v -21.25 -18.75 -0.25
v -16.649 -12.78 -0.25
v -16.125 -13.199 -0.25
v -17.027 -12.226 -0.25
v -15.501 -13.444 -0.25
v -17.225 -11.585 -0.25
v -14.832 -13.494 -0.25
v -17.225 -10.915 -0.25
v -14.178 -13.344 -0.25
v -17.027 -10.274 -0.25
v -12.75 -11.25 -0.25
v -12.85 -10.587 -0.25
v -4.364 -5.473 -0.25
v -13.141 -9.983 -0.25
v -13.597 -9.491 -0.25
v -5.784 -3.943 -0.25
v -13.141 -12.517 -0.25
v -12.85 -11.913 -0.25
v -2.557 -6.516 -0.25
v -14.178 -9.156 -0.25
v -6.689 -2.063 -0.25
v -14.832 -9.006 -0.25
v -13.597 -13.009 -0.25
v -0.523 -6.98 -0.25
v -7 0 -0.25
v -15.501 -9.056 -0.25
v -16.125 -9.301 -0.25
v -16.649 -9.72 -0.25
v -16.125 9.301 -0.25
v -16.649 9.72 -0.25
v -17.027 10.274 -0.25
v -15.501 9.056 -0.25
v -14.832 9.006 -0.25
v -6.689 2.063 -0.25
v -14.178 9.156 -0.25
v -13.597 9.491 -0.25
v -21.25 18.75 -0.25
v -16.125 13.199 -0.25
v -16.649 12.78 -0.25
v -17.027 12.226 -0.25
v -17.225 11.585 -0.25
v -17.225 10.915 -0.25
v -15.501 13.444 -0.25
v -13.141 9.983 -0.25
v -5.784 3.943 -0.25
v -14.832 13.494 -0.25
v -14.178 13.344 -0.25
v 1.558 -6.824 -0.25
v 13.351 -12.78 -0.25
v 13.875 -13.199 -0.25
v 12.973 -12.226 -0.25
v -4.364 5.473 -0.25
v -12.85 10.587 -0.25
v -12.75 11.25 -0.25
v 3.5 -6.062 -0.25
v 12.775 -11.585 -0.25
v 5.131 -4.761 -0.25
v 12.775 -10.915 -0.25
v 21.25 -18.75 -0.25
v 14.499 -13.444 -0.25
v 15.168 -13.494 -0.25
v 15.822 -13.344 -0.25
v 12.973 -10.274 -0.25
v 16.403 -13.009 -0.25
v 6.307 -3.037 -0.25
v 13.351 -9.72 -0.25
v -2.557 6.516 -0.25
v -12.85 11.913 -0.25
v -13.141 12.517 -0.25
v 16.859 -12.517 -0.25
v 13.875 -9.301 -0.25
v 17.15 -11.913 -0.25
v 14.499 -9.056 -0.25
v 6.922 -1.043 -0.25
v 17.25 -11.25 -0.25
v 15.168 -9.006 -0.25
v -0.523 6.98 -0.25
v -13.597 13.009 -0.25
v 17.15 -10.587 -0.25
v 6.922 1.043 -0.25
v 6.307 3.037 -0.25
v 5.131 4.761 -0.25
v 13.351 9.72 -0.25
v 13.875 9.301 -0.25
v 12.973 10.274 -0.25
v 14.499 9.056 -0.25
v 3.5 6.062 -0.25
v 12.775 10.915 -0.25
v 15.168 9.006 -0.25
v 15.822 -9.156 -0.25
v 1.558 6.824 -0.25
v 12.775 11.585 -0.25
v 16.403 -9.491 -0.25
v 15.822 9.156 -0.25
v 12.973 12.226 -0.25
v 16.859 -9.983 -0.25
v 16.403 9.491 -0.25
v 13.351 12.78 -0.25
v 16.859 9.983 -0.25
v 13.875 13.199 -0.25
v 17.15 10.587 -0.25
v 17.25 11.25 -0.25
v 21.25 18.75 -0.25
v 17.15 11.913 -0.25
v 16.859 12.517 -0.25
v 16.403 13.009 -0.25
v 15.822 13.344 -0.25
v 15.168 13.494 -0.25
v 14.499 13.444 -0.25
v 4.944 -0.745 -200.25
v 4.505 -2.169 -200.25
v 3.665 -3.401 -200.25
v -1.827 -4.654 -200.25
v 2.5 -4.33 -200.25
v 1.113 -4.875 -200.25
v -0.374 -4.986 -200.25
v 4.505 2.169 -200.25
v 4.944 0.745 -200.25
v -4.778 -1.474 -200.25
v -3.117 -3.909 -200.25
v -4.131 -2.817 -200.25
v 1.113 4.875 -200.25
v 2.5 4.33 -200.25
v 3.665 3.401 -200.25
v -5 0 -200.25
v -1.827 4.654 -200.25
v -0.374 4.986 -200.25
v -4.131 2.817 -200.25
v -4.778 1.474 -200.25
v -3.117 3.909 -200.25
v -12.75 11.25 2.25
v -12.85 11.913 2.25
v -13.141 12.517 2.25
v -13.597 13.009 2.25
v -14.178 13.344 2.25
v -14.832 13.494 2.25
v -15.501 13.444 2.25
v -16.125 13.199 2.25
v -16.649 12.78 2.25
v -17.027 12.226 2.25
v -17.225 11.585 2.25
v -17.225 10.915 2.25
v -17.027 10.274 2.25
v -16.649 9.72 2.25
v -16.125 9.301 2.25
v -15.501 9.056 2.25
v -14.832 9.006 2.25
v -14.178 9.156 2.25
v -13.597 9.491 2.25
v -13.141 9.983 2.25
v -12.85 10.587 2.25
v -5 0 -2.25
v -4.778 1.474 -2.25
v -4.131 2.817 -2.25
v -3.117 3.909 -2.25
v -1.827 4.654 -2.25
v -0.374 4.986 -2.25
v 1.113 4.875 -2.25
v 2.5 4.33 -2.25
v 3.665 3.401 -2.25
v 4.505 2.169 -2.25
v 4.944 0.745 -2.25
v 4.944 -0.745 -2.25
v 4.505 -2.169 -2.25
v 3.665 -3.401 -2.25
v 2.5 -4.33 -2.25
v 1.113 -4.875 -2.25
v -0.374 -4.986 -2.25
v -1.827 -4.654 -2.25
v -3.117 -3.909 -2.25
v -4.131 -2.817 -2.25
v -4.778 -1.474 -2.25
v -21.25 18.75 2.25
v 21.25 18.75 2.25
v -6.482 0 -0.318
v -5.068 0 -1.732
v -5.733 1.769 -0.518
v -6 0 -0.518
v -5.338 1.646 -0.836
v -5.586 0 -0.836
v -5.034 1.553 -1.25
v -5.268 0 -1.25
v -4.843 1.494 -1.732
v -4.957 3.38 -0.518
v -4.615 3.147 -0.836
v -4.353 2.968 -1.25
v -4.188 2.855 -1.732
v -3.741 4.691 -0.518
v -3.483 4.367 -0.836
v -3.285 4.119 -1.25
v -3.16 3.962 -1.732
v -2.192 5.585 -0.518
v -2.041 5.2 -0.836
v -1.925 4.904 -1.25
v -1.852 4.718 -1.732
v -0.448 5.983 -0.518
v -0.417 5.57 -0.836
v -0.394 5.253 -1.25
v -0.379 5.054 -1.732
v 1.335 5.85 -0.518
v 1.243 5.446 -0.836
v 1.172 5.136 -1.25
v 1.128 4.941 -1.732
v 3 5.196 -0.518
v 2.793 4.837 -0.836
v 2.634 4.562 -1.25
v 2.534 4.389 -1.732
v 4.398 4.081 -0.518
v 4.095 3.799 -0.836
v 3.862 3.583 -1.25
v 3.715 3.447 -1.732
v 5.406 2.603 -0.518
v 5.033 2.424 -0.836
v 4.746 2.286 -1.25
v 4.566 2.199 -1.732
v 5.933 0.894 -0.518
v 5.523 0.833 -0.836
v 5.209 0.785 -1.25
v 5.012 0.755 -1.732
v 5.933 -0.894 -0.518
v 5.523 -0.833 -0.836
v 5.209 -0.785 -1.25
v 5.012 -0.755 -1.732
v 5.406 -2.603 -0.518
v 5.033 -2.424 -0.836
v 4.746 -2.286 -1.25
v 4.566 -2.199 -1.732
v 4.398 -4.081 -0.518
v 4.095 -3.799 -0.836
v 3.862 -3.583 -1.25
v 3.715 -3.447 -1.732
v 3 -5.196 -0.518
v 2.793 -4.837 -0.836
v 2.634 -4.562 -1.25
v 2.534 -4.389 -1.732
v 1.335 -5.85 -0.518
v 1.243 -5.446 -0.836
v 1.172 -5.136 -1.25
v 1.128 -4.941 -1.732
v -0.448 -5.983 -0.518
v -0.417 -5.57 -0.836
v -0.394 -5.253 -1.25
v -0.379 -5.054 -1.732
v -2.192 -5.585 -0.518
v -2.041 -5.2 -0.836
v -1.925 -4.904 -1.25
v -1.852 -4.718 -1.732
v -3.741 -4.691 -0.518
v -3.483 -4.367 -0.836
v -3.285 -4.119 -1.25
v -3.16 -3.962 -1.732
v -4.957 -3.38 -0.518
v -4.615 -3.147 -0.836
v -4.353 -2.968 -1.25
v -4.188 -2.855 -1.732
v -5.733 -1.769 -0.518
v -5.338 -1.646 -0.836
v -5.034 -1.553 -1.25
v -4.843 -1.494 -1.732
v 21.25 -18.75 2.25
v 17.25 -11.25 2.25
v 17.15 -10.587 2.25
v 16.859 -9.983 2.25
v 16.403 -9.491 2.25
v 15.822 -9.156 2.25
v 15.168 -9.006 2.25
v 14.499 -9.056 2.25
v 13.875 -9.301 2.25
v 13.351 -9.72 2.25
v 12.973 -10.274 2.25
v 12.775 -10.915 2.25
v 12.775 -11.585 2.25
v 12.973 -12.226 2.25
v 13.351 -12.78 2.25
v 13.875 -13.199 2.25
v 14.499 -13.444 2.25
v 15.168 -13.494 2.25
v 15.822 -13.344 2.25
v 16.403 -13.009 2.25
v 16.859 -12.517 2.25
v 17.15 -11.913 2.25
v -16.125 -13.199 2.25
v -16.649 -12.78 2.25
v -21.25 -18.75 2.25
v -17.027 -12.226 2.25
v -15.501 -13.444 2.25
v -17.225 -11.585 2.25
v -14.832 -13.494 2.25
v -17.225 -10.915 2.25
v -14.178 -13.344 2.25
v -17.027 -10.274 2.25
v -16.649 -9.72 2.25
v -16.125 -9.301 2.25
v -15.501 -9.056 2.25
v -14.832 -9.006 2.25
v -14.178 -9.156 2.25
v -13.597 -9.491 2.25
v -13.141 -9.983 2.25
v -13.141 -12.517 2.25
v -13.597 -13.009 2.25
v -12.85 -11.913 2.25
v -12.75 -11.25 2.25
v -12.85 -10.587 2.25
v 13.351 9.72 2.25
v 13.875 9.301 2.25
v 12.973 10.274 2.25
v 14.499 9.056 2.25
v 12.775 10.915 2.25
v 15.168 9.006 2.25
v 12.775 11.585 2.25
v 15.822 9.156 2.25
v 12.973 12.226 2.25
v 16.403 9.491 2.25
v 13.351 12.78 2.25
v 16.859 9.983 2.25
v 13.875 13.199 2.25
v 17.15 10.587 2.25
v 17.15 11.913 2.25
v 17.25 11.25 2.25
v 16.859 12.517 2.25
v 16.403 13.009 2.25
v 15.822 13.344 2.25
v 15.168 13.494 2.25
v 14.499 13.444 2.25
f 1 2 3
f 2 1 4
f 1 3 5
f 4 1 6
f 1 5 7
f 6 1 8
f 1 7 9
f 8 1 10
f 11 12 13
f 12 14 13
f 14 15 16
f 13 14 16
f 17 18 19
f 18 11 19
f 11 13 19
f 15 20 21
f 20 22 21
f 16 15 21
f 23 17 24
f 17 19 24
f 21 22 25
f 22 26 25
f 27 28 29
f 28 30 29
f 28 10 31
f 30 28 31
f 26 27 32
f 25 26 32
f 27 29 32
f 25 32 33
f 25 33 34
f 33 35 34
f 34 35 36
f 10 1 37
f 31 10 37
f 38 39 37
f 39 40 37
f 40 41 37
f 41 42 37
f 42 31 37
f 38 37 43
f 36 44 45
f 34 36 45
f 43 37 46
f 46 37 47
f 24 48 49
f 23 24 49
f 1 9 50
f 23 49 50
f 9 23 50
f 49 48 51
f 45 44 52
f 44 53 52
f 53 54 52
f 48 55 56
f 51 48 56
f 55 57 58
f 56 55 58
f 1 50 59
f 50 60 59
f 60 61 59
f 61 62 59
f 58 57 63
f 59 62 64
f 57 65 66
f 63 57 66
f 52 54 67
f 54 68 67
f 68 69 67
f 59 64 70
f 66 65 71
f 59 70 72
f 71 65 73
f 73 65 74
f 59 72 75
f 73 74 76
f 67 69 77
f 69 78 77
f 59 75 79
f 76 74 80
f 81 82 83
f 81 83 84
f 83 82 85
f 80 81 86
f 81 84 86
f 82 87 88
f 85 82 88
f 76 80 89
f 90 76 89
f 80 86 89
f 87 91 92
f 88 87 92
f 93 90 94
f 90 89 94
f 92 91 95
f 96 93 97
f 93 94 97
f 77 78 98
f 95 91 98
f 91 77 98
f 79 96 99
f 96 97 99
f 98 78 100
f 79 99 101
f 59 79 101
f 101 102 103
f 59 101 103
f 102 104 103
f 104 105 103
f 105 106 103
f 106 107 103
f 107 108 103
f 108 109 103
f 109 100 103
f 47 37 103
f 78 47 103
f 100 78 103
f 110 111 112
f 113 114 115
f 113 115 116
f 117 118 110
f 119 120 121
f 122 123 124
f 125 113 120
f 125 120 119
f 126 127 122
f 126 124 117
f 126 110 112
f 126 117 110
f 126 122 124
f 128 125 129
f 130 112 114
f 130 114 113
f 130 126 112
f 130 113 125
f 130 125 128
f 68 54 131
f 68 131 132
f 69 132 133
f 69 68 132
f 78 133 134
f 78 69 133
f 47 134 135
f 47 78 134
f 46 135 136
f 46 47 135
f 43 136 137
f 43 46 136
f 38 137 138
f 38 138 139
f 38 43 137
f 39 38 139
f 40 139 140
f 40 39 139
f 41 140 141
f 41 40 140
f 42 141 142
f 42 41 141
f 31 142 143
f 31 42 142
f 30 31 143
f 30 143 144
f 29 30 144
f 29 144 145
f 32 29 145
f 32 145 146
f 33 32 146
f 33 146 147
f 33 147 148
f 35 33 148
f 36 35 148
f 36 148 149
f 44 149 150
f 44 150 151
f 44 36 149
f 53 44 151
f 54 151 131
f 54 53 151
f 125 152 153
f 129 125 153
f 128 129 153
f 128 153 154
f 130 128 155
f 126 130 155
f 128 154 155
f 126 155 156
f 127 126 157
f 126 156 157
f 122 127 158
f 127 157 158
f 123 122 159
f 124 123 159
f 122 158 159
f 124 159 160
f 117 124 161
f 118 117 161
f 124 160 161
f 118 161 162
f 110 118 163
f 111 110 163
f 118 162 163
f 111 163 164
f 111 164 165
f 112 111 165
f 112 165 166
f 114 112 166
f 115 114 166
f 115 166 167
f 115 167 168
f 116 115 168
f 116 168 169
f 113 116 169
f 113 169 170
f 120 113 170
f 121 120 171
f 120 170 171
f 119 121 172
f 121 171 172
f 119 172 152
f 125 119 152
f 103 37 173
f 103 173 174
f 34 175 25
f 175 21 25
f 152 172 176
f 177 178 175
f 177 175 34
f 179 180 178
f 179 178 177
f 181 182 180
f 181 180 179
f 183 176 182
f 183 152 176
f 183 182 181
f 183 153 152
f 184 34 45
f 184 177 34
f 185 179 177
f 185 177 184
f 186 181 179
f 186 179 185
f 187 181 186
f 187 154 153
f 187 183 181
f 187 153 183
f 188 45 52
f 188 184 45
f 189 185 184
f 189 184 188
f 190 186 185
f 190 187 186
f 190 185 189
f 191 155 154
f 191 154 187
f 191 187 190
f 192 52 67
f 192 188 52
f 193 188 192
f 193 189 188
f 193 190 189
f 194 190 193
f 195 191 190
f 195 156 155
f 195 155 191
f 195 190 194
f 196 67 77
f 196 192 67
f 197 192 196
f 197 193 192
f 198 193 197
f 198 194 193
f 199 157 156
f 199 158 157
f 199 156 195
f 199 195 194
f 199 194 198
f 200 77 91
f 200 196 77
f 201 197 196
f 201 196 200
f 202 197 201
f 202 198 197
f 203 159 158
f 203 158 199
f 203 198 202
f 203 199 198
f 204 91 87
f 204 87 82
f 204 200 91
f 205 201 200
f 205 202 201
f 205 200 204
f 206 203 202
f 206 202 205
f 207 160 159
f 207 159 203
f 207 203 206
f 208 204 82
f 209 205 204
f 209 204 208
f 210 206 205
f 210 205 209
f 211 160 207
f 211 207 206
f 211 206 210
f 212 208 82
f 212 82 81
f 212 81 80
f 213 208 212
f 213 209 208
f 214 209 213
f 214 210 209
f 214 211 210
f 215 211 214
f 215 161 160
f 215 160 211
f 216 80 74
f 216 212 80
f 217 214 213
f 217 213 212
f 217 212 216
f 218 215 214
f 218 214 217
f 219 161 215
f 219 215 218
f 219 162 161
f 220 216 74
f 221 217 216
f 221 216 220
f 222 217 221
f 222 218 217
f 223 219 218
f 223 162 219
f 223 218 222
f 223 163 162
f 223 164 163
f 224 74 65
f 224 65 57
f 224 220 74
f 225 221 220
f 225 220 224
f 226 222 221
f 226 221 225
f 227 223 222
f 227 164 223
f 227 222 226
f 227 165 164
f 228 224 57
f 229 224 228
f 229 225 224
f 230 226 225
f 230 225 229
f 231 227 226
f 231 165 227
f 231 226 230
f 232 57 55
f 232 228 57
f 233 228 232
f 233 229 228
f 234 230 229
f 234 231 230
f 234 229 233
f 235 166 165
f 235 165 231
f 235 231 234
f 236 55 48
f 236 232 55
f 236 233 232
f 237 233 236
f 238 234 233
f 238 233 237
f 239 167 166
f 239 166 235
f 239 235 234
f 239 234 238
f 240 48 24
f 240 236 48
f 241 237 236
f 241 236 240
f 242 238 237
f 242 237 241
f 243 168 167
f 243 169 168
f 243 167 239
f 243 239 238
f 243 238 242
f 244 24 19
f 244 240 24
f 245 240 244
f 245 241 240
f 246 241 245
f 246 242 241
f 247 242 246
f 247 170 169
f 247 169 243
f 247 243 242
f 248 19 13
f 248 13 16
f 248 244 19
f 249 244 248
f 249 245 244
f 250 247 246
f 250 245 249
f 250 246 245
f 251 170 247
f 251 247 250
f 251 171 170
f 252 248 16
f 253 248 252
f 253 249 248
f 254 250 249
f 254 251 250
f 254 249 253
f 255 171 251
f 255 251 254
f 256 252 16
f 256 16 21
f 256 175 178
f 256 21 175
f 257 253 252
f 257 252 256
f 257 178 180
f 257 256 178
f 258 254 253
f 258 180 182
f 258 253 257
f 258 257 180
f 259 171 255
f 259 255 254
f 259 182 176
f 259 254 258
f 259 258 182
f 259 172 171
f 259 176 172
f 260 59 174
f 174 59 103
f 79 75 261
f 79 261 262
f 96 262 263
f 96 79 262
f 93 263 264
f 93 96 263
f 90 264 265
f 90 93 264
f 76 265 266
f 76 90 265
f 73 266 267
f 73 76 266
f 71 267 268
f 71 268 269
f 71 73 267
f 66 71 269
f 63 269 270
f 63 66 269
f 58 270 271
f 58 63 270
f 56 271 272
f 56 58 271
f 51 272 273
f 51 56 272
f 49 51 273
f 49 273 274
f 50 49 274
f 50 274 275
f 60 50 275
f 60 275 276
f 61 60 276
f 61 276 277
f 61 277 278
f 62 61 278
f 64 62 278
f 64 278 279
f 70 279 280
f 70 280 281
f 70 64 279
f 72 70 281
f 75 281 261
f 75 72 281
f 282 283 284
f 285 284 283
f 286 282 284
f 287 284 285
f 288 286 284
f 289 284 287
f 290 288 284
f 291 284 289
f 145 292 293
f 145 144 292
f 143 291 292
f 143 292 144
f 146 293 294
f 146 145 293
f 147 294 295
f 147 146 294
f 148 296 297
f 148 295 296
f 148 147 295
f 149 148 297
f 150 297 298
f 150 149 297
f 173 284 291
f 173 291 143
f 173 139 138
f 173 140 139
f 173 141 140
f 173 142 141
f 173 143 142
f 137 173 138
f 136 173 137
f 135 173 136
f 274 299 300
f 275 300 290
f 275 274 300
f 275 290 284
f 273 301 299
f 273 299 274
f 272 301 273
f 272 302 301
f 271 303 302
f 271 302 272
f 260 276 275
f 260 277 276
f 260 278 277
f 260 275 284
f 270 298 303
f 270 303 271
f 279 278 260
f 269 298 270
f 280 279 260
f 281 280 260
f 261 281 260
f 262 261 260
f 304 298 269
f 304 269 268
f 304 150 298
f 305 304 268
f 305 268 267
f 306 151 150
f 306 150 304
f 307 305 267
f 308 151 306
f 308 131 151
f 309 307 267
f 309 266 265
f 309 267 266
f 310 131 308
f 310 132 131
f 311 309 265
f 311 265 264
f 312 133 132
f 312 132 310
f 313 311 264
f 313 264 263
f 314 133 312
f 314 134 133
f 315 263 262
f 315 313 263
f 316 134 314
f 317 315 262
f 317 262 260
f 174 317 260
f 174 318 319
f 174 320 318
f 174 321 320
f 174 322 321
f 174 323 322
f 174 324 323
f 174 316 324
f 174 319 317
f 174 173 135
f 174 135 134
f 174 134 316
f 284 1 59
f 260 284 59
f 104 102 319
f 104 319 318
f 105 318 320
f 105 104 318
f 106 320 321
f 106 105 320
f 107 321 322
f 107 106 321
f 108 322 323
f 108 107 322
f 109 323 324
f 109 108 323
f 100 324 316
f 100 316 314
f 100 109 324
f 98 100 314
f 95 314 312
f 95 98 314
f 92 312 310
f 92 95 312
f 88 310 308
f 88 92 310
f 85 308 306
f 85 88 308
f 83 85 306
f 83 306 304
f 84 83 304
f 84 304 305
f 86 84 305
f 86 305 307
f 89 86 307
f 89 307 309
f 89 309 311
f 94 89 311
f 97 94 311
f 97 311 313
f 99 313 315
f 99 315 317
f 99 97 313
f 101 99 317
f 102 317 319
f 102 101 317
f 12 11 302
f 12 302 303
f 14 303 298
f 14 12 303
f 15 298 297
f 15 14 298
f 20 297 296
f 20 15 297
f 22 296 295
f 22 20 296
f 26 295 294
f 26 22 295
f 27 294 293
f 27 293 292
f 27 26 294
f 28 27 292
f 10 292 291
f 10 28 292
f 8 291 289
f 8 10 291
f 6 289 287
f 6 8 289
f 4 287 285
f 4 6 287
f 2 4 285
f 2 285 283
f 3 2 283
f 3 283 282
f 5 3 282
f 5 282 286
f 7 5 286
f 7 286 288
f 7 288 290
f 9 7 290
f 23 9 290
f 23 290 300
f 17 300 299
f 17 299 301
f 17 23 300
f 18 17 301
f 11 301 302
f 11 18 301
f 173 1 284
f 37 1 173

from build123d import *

# Parameters (mm, degrees)
SKETCH1_W           = 34
SKETCH1_H           = 30
SKETCH1_R           = 1.8
BOSS_EXTRUDE1_DEPTH = 2
SCALE1_SCALE        = 1.25
SKETCH2_R           = 5
BOSS_EXTRUDE3_DEPTH = 200
FILLET2_R           = 2


with BuildPart() as part:
    # Sketch1 → Boss-Extrude1 (new body)
    with BuildSketch(Plane.XY):
        Rectangle(SKETCH1_W, SKETCH1_H)
        with Locations((-12, 9)):
            Circle(SKETCH1_R, mode=Mode.SUBTRACT)
        with Locations((12, 9)):
            Circle(SKETCH1_R, mode=Mode.SUBTRACT)
        with Locations((12, -9)):
            Circle(SKETCH1_R, mode=Mode.SUBTRACT)
        with Locations((-12, -9)):
            Circle(SKETCH1_R, mode=Mode.SUBTRACT)
    extrude(amount=BOSS_EXTRUDE1_DEPTH)


with BuildPart() as part_1:
    # Scale1: scaled about (0, 0, 1)
    add(part.part.scale(SCALE1_SCALE).moved(Location((0, 0, -0.25))))

    # Sketch2 → Boss-Extrude3 (add)
    with BuildSketch(Plane(origin=(0, 0, -0.25), x_dir=(-1, 0, 0), z_dir=(0, 0, -1))):
        Circle(SKETCH2_R)
    extrude(amount=BOSS_EXTRUDE3_DEPTH)

    # Fillet2
    fillet2_edges = [part_1.edges().sort_by_distance(p)[0] for p in [
        (5, 0, -0.25),
    ]]
    fillet(fillet2_edges, radius=FILLET2_R)


solid = part_1.part
